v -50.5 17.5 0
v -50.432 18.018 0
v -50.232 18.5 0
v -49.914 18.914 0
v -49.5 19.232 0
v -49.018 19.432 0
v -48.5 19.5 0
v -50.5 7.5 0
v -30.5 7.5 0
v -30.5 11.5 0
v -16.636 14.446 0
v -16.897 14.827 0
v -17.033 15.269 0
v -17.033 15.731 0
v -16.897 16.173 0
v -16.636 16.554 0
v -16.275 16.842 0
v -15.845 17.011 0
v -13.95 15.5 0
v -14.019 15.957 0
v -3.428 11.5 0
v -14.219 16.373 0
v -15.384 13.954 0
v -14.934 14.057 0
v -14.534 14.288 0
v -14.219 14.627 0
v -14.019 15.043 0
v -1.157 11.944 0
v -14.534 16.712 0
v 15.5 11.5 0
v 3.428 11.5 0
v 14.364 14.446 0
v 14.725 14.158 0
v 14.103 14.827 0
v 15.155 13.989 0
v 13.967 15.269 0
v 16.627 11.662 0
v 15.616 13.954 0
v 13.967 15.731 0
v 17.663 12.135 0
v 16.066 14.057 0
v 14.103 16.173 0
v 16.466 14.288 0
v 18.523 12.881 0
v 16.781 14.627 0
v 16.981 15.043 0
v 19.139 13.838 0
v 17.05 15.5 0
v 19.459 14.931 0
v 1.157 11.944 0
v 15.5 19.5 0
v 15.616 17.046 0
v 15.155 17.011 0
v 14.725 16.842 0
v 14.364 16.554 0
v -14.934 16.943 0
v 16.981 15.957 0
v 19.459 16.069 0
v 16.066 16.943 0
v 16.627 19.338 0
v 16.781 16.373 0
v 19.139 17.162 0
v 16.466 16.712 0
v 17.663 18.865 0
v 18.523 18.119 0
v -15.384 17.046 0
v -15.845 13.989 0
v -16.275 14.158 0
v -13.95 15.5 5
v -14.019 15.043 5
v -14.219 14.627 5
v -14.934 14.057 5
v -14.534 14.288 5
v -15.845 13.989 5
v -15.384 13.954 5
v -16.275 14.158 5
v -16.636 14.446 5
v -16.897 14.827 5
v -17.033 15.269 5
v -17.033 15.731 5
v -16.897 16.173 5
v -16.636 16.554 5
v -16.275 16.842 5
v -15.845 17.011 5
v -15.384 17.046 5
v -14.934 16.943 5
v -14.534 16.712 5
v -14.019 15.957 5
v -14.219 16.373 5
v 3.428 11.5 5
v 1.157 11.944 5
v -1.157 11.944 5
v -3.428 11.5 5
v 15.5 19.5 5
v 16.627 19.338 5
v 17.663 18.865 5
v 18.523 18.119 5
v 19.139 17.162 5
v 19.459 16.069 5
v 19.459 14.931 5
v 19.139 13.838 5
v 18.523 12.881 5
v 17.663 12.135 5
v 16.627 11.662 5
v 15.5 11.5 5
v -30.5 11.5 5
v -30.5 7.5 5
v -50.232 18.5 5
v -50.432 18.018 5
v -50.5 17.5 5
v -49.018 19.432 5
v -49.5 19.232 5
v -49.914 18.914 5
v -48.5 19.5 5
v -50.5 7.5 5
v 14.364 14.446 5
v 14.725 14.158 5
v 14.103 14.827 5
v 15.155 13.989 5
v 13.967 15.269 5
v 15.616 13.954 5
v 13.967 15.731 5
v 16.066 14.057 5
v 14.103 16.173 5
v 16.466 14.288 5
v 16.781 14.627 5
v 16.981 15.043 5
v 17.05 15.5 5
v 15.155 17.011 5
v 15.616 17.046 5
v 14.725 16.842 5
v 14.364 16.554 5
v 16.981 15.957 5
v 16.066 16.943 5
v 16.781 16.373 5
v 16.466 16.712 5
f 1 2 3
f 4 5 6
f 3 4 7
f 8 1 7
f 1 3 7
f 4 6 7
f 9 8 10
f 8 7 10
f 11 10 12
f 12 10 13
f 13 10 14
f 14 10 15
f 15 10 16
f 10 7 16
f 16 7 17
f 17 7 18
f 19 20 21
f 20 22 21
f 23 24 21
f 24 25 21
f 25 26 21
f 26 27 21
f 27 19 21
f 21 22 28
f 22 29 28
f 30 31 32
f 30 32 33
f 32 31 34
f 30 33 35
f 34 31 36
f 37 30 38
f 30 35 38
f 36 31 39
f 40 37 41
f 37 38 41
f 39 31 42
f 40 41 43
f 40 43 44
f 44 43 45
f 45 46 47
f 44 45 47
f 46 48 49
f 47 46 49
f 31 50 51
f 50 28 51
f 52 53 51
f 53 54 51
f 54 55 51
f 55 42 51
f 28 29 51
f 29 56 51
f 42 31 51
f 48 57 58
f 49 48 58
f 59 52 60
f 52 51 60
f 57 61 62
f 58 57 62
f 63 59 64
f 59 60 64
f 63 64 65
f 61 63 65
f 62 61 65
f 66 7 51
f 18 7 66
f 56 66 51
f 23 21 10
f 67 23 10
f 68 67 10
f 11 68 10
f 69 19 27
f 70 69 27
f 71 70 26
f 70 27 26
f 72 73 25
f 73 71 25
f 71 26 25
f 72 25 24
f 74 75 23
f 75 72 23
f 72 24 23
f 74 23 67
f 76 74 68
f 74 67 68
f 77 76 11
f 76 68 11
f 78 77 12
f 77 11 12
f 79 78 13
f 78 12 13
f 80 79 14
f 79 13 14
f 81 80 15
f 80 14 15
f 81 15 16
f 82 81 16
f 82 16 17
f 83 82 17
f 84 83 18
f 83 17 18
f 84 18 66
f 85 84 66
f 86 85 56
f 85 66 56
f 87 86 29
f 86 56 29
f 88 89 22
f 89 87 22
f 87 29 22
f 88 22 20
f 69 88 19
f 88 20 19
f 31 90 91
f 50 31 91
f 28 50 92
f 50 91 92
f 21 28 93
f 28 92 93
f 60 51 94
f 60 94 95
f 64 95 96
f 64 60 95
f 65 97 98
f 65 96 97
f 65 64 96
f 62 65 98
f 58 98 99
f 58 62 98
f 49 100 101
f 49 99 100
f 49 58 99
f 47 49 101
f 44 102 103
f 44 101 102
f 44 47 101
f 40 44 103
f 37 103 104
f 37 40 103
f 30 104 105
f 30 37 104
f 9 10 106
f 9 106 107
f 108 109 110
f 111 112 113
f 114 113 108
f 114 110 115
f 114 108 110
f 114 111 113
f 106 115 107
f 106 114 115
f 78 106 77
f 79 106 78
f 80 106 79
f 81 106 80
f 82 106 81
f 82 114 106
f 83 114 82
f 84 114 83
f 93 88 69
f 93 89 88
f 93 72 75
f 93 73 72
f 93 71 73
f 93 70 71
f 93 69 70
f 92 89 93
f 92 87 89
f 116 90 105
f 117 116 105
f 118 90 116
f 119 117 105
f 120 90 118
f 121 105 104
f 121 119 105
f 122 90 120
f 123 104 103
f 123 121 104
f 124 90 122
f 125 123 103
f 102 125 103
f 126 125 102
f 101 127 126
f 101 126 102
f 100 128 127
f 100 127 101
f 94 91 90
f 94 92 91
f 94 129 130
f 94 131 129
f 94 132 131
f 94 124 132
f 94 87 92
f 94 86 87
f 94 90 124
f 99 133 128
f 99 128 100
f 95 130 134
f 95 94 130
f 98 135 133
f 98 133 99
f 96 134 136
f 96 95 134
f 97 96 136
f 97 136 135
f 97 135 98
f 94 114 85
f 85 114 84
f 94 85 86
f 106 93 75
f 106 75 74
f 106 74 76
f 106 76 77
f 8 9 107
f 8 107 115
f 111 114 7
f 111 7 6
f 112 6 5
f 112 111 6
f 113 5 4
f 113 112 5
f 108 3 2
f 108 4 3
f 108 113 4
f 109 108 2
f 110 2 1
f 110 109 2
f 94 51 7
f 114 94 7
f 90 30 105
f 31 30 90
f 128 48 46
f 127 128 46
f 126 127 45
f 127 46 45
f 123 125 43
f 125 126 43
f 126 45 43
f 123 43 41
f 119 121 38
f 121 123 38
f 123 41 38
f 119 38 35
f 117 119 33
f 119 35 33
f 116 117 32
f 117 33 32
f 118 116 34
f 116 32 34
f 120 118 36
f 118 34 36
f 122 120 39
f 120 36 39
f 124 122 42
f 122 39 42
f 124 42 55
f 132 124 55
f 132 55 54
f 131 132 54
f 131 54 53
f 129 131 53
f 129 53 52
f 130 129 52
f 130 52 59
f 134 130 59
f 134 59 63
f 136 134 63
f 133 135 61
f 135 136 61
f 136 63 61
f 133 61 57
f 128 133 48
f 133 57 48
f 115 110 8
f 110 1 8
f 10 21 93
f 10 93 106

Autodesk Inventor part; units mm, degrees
ref_plane "YZ Plane" through (0, 0, 0) normal (1, 0, 0) x (0, 1, 0)
ref_plane "XZ Plane" through (0, 0, 0) normal (0, 1, 0) x (-1, 0, 0)
ref_plane "XY Plane" through (0, 0, 0) normal (0, 0, 1) x (1, 0, 0)
sketch "Skizze1" plane through (0, 0, 0) normal (0, 0, 1) x (1, 0, 0)
  line L0 (0, -28.5) -> (0, 27.5) projected
  line L1 (-71.9, 0) -> (35.9, 0) projected
  circle A0 centre (-15.5, 15.5) radius 1.55
  circle A1 centre (15.5, 15.5) radius 1.55
  circle A2 centre (-15.5, -15.5) radius 1.55
  circle A3 centre (15.5, -15.5) radius 1.55
  circle A4 centre (-16.5, 0) radius 11
  circle A5 centre (0, 0) radius 5.5
  circle A6 centre (-16.5, 0) radius 4
  arc A7 (-16.5, -7.5) -> (-16.5, 7.5) centre (-16.5, 0) ccw
  line L2 (-16.5, 7.5) -> (-36.5, 7.5)
  line L3 (-36.5, 7.5) -> (-56.5, 7.5)
  line L4 (-56.5, 7.5) -> (-56.5, -7.5)
  line L5 (-56.5, -7.5) -> (-16.5, -7.5)
  circle A8 centre (15.5, 15.5) radius 4
  circle A9 centre (15.5, -15.5) radius 5
  circle A10 centre (-15.5, 15.5) radius 4
  circle A11 centre (-15.5, -15.5) radius 4
  line L6 (15.5, 11.5) -> (-15.5, 11.5)
  line L7 (15.5, 19.5) -> (-15.5, 19.5)
  line L8 (-15.5, 19.5) -> (-50.5, 19.5)
  line L9 (-50.5, 19.5) -> (-50.5, 7.5)
  line L10 (-15.5, 11.5) -> (-30.5, 11.5)
  line L11 (-30.5, 11.5) -> (-30.5, 7.5)
  dimension "d0" = 3.1
  dimension "d1" = 15.5
  dimension "d2" = 15.5
  dimension "d3" = 22
  dimension "d4" = 16.5
  dimension "d5" = 11
  dimension "d6" = 8
  dimension "d7" = 15
  dimension "d10" = 15
  dimension "d11" = 40
  dimension "d17" = 8
  dimension "d18" = 10
  dimension "d19" = 8
  dimension "d20" = 8
  dimension "d22" = 35
  dimension "d23" = 15
extrude "Extrusion3" add sketch "Skizze1" along normal blind 5 contours L6 A10 L7 L0 | L0 L7 A8 L6 | L2 L3 L9 L8 A10 L10 L11 | A8 | A10
sketch "Skizze3" plane through (0, 0, 5) normal (0, 0, 1) x (1, 0, 0)
  circle A0 centre (0, 0) radius 12 projected
  circle A1 centre (-13.5, -33.5) radius 2.75 projected
  circle A2 centre (13.5, -33.5) radius 2.75 projected
  circle A3 centre (-15.5, -15.5) radius 1.75 projected
  circle A4 centre (15.5, -15.5) radius 1.75 projected
  circle A5 centre (-15.5, 15.5) radius 1.75 projected
  circle A6 centre (15.5, 15.5) radius 1.75 projected
  line L0 (19.5, -43.5) -> (21.5, -41.5) projected
  line L1 (21.5, -41.5) -> (21.5, 19.5) projected
  line L2 (21.5, 19.5) -> (19.5, 21.5) projected
  line L3 (19.5, 21.5) -> (-19.5, 21.5) projected
  line L4 (-19.5, 21.5) -> (-21.5, 19.5) projected
  line L5 (-21.5, 19.5) -> (-21.5, -41.5) projected
  line L6 (-21.5, -41.5) -> (-19.5, -43.5) projected
  line L7 (-19.5, -43.5) -> (19.5, -43.5) projected
  line L8 (-30.5, 11.5) -> (15.5, 11.5) projected
  line L9 (3.4278, 11.5) -> (-3.4278, 11.5)
  point P0 (0, 0)
extrude "Extrusion4" cut sketch "Skizze3" against normal blind 5 contours L8 A0 picked at (0.3856, 11.648)
fillet "Rundung1" radius 2 1 edges at (-50.5, 19.5, 2.5)
properties part number "Drückbrücke" material "ABS-Kunststoff"
